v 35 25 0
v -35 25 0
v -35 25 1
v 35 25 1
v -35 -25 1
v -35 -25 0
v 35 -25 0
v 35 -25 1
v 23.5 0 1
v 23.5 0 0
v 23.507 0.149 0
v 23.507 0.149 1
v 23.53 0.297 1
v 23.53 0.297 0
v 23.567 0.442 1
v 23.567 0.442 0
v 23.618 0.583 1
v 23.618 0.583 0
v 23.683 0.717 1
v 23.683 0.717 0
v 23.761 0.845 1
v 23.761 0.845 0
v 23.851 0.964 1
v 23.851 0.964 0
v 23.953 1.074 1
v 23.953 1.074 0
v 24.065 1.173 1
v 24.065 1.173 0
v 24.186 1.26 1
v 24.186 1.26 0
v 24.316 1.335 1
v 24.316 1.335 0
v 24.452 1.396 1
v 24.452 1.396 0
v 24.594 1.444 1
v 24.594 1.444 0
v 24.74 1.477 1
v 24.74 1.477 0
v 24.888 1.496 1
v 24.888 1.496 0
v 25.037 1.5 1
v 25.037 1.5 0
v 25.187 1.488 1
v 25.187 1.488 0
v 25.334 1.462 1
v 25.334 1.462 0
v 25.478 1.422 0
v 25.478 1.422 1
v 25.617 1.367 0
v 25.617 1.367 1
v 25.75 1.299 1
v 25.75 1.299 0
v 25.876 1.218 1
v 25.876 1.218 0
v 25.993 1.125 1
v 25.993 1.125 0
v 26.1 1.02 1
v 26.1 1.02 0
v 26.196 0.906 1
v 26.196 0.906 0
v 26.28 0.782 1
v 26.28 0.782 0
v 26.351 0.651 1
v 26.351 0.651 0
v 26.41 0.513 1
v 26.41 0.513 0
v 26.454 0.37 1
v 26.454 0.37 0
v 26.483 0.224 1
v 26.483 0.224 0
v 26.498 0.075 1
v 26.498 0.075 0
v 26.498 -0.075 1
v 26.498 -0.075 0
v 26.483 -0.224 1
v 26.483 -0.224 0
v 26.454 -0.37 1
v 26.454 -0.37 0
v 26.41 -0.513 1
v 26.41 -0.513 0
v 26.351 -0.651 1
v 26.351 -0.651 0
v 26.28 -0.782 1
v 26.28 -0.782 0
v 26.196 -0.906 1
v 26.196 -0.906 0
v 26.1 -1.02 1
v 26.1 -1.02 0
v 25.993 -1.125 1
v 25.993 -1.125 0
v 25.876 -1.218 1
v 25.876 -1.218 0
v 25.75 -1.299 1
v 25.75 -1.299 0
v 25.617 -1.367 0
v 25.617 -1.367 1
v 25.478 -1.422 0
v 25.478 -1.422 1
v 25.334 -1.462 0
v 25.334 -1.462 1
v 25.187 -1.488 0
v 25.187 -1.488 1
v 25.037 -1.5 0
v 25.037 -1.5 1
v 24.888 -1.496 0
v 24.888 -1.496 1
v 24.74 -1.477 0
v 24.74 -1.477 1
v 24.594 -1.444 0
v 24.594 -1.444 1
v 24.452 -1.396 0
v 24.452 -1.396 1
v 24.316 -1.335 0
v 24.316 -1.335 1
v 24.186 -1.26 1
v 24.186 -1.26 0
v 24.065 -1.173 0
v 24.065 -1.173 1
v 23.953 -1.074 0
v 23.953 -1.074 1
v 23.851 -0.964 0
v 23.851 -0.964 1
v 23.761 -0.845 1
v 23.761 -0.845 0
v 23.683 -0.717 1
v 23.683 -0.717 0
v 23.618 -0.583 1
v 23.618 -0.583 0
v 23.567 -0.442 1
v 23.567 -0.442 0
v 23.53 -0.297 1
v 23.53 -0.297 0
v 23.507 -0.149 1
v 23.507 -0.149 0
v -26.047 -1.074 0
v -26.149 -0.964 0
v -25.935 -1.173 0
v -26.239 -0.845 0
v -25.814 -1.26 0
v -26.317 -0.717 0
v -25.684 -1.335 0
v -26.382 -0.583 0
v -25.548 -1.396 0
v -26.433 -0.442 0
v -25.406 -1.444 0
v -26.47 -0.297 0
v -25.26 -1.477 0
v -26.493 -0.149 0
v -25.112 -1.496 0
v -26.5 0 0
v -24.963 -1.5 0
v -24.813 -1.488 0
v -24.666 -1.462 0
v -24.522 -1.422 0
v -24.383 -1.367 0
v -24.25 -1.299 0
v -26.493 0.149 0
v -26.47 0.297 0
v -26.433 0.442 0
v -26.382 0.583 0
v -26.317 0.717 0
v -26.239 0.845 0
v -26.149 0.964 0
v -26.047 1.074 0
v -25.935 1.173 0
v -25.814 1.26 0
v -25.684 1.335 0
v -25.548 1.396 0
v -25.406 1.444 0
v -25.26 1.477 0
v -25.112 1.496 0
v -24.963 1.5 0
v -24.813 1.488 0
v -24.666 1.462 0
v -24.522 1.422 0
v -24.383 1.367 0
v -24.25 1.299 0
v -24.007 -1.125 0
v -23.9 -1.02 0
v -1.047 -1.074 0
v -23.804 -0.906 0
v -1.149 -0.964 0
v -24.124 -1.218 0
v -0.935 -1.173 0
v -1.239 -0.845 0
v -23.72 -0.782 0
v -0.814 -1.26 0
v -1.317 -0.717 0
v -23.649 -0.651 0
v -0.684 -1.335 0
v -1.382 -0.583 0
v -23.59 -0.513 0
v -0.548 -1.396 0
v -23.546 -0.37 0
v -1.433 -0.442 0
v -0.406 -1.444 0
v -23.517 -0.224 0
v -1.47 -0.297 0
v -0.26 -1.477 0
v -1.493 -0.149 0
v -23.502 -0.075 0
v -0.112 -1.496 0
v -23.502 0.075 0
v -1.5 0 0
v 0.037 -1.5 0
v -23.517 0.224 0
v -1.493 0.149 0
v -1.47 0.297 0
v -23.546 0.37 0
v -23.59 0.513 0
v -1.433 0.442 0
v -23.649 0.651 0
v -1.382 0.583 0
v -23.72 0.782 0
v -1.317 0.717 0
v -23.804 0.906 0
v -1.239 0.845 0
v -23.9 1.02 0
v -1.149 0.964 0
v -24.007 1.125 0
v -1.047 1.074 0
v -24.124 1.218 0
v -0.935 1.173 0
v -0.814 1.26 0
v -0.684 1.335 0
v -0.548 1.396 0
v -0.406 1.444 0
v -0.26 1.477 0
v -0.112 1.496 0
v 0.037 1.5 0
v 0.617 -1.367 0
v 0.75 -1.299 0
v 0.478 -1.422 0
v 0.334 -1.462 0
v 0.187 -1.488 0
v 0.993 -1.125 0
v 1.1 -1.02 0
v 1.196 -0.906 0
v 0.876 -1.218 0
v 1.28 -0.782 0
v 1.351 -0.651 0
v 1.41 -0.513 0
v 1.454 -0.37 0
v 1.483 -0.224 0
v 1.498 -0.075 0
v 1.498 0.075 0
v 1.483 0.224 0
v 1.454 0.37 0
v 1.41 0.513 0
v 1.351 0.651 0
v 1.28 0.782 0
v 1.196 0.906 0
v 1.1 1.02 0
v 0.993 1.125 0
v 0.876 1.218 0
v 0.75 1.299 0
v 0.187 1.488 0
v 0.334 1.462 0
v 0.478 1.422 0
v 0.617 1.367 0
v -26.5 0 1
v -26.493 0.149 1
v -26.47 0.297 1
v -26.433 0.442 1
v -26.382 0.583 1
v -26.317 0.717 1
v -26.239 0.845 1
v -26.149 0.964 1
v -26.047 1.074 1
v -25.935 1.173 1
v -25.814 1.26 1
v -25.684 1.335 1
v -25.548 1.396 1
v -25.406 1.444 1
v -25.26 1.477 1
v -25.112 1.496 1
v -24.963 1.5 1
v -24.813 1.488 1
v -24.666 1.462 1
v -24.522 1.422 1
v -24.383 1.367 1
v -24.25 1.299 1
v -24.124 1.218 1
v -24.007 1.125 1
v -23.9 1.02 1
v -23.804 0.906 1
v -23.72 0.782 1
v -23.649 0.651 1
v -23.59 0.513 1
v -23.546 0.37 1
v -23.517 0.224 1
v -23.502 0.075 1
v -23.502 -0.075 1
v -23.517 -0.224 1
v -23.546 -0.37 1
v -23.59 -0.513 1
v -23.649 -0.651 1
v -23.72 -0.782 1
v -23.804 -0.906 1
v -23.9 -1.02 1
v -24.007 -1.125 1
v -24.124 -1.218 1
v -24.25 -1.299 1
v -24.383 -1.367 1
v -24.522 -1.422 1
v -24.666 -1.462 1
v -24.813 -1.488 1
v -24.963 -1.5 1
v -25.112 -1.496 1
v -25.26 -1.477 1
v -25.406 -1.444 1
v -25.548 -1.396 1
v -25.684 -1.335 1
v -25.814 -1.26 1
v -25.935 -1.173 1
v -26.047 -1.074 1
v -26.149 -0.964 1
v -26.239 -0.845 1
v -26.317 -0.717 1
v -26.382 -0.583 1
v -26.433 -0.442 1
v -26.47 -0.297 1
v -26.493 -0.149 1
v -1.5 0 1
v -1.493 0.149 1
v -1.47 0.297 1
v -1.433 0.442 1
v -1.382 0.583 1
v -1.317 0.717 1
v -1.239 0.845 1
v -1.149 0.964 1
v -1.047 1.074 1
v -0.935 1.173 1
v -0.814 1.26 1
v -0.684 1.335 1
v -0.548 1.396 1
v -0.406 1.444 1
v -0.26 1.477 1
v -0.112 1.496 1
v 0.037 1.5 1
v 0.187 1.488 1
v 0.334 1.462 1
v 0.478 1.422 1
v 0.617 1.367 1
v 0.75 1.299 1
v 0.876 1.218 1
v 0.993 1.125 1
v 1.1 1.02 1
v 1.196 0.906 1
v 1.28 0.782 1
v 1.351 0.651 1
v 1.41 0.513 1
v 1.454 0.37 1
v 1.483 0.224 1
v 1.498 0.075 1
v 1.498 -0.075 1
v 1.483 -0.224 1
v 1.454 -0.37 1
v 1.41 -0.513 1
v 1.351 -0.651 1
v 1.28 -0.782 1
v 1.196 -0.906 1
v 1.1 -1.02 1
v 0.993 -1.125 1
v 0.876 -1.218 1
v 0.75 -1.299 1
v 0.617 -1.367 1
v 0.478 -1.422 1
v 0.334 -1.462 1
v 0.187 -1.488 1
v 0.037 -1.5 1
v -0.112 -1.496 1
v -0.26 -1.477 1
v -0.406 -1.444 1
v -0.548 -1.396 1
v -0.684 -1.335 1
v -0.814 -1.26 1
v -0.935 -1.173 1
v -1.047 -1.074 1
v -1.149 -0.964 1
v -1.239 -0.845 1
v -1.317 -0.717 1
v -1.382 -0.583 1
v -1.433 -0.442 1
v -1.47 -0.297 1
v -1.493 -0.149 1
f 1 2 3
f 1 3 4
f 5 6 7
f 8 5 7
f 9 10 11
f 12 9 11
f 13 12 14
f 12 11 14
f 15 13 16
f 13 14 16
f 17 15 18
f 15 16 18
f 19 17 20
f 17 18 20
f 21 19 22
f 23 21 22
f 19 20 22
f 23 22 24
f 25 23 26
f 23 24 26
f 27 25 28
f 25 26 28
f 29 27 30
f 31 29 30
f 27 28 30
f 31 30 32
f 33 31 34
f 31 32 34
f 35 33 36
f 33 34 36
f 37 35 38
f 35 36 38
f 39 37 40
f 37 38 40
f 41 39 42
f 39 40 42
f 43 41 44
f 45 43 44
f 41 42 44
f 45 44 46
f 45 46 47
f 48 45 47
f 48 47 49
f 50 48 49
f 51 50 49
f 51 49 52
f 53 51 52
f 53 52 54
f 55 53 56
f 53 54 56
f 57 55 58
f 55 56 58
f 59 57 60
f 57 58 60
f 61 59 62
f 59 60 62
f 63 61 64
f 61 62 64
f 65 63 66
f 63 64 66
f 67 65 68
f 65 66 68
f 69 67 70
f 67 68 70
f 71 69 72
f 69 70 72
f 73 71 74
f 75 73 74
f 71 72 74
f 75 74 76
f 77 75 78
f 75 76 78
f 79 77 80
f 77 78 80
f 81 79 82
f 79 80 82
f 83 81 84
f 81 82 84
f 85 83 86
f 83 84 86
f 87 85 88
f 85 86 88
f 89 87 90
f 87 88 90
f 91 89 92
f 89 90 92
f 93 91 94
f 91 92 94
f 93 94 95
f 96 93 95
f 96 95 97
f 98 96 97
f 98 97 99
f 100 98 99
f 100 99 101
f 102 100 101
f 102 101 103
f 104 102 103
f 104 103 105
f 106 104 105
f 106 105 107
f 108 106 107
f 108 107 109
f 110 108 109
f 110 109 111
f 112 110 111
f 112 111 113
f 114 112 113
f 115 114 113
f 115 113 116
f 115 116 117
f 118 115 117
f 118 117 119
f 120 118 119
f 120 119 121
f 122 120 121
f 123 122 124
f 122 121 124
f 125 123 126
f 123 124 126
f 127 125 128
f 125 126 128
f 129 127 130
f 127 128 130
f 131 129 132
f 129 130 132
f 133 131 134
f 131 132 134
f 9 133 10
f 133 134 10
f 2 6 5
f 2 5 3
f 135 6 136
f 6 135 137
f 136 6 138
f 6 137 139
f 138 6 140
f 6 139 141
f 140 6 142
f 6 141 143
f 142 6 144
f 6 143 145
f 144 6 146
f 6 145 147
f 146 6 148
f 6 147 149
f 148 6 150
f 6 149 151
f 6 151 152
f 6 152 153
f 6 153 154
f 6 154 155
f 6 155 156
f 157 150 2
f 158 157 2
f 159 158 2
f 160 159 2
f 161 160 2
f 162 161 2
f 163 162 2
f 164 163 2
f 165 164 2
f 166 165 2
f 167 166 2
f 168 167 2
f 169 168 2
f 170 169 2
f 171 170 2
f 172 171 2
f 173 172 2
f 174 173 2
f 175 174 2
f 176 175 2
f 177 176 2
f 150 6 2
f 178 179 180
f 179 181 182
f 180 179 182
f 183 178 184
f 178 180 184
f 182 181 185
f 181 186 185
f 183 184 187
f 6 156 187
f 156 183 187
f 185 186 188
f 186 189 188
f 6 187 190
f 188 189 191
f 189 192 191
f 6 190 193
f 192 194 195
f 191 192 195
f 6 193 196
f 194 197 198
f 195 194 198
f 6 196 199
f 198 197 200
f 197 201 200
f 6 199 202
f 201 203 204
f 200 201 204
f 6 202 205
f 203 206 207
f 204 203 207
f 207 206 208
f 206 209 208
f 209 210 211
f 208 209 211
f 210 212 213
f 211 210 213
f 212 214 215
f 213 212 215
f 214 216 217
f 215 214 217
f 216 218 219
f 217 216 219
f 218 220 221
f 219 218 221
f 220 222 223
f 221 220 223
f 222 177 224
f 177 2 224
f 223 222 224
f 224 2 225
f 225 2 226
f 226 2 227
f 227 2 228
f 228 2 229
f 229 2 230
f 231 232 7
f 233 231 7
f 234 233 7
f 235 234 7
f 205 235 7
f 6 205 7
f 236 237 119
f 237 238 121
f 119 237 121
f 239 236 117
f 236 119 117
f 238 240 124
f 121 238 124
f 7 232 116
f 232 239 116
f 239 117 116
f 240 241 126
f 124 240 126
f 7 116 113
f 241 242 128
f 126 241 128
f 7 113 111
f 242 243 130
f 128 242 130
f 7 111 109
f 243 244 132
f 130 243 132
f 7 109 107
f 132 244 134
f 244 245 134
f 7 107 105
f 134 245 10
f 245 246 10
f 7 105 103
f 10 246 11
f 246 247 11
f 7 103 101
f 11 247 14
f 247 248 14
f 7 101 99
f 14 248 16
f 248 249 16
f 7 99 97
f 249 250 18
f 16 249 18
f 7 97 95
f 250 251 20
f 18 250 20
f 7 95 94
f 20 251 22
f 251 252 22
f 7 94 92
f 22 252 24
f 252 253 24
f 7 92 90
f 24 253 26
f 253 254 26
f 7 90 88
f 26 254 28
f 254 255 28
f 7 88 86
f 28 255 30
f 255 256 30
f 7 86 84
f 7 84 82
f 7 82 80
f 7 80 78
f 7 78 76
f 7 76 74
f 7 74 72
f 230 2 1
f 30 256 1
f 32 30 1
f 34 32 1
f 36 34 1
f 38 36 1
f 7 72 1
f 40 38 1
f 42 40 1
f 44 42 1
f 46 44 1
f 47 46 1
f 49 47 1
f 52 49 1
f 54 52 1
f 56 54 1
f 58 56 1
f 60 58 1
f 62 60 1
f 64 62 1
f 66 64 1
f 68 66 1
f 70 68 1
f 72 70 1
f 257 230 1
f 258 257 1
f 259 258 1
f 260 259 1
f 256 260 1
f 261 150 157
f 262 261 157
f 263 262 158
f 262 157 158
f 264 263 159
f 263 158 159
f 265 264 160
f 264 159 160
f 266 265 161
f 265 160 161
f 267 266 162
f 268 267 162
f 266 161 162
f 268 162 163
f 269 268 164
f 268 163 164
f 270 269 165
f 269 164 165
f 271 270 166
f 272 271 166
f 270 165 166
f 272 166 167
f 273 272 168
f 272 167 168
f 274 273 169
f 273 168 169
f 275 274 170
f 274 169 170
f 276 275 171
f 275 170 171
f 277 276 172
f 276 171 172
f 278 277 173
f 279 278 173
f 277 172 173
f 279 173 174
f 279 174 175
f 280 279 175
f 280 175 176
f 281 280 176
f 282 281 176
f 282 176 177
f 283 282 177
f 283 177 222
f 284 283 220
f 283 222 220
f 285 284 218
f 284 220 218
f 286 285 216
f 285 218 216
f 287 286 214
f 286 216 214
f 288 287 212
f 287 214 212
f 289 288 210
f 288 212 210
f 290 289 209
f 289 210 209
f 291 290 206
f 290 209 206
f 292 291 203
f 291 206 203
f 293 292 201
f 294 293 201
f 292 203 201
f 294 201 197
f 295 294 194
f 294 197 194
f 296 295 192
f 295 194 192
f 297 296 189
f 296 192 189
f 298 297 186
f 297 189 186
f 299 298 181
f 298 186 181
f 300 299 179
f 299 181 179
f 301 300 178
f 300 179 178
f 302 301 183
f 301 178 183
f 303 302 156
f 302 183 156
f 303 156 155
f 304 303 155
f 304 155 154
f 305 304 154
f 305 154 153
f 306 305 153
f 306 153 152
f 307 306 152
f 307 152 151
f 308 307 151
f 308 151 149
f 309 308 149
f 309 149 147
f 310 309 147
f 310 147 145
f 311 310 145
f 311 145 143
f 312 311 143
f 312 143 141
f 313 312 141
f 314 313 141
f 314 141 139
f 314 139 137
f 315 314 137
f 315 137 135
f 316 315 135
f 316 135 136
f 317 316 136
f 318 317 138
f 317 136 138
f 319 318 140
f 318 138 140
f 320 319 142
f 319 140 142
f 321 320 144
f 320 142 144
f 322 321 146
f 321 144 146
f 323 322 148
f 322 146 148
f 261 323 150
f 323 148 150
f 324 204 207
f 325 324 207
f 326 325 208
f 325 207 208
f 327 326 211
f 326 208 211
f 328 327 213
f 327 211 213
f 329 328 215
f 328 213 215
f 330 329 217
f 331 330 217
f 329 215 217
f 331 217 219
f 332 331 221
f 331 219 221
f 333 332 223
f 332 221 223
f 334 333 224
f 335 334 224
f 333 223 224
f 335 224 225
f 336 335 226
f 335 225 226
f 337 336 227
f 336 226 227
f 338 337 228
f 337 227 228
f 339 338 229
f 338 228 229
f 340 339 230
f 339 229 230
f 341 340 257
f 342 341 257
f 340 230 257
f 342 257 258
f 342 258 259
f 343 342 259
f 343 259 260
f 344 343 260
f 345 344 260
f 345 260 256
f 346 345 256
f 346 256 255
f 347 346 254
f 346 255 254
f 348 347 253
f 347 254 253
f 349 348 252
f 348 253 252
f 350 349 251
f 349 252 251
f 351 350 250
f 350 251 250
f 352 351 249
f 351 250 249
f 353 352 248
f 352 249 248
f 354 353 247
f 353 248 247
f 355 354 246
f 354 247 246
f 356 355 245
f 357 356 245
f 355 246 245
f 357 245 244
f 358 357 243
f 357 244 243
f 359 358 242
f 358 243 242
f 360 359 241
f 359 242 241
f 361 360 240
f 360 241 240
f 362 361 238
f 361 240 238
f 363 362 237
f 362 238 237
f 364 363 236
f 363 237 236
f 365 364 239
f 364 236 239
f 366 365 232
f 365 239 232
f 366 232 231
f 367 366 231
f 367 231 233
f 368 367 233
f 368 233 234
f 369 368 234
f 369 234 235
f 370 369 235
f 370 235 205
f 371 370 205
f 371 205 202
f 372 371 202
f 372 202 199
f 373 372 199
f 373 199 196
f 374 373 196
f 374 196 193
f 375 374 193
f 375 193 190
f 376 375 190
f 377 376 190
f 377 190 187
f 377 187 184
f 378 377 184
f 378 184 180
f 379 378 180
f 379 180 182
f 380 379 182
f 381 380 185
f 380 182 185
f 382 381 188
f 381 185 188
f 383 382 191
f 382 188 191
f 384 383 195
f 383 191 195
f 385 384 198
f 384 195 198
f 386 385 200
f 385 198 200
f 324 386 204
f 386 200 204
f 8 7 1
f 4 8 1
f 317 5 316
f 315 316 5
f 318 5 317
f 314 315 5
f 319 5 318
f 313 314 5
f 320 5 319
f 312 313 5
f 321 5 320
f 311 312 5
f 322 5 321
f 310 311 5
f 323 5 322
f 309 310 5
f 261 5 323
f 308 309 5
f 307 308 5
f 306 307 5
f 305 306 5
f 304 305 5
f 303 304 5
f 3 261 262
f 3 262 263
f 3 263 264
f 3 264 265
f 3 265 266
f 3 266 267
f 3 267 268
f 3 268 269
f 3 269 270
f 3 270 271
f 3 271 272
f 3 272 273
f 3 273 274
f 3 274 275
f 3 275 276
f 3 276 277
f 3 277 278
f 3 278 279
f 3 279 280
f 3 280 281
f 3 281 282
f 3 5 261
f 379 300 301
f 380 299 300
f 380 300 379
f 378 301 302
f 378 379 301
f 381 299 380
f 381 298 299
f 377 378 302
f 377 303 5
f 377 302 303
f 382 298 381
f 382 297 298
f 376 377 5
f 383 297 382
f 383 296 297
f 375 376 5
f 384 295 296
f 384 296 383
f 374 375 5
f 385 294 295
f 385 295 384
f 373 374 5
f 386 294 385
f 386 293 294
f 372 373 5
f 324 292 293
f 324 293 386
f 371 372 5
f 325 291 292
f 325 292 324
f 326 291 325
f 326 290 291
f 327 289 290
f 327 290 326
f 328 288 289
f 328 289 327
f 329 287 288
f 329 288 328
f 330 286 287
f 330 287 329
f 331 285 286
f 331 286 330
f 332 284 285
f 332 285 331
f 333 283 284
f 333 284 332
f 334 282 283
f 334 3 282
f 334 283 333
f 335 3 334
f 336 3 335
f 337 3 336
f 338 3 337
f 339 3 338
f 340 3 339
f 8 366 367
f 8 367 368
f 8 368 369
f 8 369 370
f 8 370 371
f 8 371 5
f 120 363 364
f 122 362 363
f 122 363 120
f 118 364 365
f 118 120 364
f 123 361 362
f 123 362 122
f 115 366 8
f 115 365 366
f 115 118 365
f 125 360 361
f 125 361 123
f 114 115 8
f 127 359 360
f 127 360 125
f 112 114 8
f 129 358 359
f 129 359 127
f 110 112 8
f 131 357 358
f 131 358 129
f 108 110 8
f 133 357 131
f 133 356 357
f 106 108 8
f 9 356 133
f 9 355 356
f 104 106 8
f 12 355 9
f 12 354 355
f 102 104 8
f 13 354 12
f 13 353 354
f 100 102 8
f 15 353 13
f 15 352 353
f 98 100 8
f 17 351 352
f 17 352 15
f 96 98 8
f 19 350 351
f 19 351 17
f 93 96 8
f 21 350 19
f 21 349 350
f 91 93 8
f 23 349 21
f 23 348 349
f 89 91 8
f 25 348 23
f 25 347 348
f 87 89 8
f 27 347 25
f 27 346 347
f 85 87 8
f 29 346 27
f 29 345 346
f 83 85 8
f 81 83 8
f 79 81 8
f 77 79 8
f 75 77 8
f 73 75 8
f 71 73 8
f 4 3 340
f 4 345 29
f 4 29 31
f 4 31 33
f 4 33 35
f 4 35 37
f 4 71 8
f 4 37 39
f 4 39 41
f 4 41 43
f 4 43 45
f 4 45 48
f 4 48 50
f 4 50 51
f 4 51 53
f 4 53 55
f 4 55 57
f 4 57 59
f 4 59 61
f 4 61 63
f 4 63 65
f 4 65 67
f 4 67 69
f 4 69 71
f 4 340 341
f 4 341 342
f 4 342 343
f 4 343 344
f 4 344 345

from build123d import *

# Parameters (mm, degrees)
CROQUIS1_W              = 70
CROQUIS1_H              = 50
SALIENTE_EXTRUIR1_DEPTH = 1
CROQUIS2_R              = 1.5
CORTAR_EXTRUIR1_DEPTH   = 1


with BuildPart() as part:
    # Croquis1 → Saliente-Extruir1 (new body)
    with BuildSketch(Plane.XY):
        Rectangle(CROQUIS1_W, CROQUIS1_H)
    extrude(amount=SALIENTE_EXTRUIR1_DEPTH)

    # Croquis2 → Cortar-Extruir1 (cut)
    with BuildSketch(Plane(origin=(0, 0, 0), x_dir=(-1, 0, 0), z_dir=(0, 0, -1))):
        with Locations((-25, 0)):
            Circle(CROQUIS2_R)
        Circle(CROQUIS2_R)
        with Locations((25, 0)):
            Circle(CROQUIS2_R)
    extrude(amount=-CORTAR_EXTRUIR1_DEPTH, mode=Mode.SUBTRACT)


solid = part.part
